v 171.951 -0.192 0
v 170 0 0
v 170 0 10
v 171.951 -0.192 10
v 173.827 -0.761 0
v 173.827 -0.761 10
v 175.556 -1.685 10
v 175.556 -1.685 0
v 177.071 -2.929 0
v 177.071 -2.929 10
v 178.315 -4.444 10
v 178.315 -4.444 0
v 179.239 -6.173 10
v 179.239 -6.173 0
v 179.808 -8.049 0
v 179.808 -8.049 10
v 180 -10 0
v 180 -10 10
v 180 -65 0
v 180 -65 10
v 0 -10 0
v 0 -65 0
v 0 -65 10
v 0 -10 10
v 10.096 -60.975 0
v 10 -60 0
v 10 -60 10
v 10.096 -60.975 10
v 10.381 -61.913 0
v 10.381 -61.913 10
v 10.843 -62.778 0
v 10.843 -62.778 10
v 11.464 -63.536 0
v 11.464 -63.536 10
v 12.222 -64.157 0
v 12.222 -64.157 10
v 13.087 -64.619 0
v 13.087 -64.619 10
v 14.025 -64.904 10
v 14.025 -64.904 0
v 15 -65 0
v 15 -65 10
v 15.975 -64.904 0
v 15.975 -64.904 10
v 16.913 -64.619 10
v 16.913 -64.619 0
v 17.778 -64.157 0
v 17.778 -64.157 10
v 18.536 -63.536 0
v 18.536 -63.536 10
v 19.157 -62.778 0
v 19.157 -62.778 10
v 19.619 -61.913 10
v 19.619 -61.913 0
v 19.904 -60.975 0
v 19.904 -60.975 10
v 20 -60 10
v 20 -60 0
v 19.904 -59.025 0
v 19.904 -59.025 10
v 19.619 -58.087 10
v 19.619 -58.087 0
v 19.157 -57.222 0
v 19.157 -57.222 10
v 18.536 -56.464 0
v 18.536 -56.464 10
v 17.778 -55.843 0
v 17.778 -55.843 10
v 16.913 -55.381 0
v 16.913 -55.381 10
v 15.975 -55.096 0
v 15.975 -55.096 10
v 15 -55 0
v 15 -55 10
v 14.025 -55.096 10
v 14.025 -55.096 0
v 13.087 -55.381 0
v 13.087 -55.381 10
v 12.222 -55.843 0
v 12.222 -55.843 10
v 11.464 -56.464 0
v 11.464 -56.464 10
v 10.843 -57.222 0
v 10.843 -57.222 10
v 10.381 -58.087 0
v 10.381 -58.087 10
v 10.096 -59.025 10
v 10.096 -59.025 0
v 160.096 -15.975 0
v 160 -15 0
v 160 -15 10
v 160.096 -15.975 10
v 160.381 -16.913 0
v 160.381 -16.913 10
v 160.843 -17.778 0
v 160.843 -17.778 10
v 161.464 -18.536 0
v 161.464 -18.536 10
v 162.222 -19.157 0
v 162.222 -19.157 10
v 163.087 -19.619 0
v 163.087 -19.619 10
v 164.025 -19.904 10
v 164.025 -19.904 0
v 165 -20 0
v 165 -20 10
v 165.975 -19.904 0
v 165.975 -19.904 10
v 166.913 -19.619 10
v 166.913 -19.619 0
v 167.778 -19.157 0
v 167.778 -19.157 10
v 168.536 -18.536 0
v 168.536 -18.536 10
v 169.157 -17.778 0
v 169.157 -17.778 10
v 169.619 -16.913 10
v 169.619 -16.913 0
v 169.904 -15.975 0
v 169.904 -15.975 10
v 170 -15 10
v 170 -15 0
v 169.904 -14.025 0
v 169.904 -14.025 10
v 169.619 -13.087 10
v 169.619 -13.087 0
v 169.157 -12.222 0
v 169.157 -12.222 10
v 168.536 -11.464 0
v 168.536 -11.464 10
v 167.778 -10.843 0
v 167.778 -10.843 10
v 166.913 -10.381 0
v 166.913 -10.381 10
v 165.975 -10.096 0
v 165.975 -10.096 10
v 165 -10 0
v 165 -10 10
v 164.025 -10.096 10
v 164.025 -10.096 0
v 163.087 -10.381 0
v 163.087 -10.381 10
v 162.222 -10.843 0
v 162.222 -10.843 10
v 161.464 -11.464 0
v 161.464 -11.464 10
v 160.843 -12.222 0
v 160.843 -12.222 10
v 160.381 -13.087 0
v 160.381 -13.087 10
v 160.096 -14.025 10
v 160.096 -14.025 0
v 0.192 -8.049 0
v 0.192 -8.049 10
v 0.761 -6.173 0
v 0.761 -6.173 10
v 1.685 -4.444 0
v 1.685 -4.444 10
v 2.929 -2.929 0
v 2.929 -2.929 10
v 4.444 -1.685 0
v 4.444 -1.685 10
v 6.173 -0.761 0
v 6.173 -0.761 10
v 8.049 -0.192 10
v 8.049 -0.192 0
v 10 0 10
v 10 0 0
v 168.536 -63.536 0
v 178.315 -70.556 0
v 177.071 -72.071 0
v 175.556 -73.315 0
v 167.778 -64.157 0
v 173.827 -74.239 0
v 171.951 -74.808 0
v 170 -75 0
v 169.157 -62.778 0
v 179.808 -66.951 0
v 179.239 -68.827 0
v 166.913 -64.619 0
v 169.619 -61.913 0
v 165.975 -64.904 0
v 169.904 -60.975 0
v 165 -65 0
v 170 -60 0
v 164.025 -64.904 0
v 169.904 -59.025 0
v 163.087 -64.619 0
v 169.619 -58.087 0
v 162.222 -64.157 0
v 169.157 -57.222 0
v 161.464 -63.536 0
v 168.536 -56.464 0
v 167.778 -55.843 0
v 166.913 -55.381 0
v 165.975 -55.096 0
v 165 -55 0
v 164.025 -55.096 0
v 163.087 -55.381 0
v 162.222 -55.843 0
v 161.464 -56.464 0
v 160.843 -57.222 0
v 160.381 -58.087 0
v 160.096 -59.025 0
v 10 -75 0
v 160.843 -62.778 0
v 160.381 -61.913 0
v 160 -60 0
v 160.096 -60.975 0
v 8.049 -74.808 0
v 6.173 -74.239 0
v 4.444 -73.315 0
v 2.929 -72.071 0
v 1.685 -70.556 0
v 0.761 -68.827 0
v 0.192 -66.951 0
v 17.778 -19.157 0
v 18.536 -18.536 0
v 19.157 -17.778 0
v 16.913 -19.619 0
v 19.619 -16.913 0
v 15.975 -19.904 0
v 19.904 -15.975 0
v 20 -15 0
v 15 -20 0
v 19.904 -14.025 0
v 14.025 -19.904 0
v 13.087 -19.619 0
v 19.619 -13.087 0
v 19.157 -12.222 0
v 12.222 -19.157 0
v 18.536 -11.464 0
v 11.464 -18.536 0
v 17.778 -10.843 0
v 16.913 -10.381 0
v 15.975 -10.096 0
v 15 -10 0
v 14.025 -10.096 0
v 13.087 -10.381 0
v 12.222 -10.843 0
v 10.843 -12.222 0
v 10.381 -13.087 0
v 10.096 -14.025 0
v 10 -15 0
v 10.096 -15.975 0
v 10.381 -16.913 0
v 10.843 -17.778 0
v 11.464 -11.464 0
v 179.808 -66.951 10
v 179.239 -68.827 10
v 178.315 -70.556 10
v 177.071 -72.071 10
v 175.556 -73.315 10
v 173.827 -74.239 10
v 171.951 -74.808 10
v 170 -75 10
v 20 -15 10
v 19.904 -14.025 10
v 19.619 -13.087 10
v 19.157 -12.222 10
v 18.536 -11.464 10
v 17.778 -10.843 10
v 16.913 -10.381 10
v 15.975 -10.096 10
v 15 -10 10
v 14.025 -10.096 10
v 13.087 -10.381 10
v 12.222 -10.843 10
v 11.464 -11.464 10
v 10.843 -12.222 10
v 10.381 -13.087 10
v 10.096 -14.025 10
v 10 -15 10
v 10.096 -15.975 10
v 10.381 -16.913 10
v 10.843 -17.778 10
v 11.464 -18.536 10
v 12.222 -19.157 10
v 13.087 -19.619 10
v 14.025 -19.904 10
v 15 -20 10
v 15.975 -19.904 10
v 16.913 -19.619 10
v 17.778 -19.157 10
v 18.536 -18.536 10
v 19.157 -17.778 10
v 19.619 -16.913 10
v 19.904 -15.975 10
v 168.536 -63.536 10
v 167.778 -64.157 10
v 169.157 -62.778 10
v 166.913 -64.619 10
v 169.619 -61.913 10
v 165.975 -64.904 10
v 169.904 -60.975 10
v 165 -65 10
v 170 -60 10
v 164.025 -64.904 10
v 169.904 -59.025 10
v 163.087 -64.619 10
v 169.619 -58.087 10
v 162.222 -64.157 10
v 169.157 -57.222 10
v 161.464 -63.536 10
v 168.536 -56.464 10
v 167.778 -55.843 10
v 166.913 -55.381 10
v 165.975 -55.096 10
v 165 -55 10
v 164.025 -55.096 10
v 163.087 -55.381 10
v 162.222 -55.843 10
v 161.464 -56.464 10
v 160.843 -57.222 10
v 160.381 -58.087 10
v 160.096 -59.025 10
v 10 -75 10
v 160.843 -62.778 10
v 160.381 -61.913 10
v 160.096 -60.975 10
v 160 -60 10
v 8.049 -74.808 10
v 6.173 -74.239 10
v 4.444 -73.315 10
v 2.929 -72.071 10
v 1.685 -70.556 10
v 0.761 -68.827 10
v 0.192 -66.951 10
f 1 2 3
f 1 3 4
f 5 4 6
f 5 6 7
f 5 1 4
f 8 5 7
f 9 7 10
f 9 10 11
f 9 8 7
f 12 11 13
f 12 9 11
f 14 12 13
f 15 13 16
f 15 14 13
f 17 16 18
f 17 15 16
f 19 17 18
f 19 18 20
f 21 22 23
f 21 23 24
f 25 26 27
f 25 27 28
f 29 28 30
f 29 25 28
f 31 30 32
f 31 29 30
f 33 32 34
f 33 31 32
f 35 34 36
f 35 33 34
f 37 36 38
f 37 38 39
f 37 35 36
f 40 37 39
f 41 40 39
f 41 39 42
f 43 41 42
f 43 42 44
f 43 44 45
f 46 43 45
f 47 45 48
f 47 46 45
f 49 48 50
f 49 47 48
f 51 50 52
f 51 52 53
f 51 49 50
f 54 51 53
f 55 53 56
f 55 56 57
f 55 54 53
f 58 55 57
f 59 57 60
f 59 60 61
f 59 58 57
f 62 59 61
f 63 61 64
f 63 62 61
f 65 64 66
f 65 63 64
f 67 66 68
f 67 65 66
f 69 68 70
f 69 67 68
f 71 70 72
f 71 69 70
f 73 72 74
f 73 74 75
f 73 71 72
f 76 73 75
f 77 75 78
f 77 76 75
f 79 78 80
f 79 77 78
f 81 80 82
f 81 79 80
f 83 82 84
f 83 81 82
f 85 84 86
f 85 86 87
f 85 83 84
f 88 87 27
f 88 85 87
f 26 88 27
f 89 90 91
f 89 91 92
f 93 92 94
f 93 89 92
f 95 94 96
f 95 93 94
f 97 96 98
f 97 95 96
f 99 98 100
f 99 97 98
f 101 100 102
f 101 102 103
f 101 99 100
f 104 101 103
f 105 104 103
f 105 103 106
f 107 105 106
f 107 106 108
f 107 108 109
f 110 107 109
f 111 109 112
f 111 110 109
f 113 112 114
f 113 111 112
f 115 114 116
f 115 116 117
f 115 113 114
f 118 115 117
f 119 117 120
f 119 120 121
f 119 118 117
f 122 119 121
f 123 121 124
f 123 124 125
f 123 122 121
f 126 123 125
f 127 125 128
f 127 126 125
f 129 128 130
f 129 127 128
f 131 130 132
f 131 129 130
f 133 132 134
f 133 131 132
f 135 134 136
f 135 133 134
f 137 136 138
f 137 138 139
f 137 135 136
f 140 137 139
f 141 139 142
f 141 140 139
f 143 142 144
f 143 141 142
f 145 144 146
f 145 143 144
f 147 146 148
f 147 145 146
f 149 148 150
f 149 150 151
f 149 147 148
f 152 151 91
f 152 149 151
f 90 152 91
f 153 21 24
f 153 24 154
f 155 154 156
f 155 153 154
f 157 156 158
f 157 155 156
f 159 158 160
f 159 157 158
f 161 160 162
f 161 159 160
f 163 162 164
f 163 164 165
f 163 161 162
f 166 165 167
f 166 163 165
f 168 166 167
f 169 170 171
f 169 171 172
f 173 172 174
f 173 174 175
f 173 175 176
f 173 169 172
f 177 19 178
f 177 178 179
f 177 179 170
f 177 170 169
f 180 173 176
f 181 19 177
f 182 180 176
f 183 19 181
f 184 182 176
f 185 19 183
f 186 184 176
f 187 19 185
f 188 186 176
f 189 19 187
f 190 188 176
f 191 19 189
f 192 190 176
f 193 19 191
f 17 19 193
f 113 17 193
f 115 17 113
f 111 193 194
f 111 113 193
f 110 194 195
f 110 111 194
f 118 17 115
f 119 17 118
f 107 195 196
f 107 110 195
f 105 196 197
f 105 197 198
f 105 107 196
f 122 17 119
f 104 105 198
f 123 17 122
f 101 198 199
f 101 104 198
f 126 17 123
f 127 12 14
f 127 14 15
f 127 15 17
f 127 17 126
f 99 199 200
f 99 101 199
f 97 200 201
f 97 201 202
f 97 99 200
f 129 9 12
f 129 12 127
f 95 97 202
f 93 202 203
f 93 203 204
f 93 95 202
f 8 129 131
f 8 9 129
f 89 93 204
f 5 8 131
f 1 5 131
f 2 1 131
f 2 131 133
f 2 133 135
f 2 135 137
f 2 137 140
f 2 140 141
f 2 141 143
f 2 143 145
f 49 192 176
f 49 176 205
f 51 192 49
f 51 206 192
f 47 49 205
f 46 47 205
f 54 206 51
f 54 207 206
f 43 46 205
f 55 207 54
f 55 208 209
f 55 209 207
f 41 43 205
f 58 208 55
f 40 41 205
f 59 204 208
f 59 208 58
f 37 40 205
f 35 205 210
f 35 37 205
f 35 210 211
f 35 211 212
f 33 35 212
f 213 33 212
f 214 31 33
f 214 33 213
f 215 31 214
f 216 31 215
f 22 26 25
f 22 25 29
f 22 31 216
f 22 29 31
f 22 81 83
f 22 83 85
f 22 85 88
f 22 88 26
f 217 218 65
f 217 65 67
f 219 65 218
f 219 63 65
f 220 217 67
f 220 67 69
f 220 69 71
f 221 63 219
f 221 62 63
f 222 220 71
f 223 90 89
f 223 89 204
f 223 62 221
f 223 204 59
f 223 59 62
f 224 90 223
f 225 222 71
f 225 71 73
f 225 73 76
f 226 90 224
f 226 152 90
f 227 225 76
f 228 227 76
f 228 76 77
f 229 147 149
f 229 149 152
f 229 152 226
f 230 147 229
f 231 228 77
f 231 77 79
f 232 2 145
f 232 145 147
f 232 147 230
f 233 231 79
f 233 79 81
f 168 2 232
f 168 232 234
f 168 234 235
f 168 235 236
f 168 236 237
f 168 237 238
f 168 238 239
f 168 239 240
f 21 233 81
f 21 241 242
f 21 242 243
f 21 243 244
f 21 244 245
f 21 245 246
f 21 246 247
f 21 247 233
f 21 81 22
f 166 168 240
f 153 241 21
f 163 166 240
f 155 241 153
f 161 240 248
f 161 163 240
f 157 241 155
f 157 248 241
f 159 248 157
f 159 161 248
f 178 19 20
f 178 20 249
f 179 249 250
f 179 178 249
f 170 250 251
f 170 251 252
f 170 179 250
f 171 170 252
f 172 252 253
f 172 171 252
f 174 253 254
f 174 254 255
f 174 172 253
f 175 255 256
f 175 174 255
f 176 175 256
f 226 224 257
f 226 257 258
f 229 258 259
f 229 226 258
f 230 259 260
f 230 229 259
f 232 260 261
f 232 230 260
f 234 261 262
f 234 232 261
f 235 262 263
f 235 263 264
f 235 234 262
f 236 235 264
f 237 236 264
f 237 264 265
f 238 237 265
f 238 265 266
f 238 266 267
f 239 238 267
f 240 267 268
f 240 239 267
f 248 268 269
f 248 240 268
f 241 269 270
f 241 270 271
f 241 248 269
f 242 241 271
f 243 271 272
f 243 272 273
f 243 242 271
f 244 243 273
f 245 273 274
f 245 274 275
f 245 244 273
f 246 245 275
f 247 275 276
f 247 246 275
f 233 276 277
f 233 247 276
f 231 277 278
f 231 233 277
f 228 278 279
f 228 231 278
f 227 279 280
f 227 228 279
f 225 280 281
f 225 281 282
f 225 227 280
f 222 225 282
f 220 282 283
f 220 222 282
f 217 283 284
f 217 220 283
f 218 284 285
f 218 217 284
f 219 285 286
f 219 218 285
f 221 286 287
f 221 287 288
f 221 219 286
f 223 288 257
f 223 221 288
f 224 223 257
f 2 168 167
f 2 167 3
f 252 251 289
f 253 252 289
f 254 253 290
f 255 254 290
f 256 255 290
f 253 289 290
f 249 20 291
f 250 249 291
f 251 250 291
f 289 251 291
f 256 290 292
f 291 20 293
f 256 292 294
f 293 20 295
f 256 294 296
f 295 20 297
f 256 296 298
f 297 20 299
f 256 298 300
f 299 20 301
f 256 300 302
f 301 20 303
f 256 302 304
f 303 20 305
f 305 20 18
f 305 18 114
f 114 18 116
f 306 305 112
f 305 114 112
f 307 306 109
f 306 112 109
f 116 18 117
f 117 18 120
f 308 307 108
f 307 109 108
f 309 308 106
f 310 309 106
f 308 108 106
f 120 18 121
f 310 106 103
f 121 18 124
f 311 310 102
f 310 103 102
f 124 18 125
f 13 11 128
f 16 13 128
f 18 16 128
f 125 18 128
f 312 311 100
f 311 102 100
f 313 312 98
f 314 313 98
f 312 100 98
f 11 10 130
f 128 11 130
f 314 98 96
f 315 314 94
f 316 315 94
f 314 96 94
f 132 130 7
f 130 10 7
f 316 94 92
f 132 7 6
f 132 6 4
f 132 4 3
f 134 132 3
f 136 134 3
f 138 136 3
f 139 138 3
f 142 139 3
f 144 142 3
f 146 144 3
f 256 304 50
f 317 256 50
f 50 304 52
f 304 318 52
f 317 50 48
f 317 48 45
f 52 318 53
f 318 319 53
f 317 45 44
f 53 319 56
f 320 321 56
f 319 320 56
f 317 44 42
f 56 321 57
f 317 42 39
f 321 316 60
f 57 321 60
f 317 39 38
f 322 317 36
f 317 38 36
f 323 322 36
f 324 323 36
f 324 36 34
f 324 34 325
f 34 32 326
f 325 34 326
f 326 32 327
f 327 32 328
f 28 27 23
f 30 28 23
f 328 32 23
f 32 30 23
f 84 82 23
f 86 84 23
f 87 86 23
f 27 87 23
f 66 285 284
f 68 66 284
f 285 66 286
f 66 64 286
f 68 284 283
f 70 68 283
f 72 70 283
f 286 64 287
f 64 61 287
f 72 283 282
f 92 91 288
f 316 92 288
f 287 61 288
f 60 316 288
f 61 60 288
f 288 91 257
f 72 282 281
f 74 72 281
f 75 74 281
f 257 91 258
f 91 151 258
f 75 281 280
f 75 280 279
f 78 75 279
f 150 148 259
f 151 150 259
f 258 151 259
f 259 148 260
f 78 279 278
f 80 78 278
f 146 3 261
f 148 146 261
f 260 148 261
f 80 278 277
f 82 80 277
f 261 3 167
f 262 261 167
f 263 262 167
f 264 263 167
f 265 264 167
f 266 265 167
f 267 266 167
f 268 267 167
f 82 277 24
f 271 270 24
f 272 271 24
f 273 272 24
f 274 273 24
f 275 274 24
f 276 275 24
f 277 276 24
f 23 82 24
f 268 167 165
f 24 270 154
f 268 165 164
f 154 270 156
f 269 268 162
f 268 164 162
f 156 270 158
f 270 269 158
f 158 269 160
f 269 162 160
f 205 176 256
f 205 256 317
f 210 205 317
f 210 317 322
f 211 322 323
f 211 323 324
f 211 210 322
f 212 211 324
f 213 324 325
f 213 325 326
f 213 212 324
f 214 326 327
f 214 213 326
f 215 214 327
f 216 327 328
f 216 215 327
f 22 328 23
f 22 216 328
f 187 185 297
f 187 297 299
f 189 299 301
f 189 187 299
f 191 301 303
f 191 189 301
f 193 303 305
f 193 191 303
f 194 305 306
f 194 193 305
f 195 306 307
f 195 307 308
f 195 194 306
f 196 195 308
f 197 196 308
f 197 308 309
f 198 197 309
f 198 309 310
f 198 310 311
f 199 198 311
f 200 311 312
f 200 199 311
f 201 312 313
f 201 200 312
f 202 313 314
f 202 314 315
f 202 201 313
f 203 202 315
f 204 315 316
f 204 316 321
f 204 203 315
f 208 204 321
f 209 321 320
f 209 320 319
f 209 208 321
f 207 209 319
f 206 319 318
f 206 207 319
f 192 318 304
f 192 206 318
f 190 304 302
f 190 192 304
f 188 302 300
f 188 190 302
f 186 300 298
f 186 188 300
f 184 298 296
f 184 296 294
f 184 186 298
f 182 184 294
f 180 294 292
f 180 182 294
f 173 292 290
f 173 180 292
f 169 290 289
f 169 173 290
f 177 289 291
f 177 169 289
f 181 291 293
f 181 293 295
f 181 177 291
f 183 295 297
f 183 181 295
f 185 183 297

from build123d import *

# Parameters (mm, degrees)
BOSS_EXTRUDE1_DEPTH = 10
SKETCH6_R           = 5
CUT_EXTRUDE1_DEPTH  = 10
SKETCH6_4_R         = 5
CUT_EXTRUDE4_DEPTH  = 10


with BuildPart() as part:
    # Sketch2 → Boss-Extrude1 (new body)
    with BuildSketch(Plane.XY):
        with BuildLine():
            Line((10, 0), (170, 0))
            ThreePointArc((170, 0), (177.071067812, -2.928932188), (180, -10))
            Line((180, -10), (180, -65))
            ThreePointArc((180, -65), (177.071067812, -72.071067812), (170, -75))
            Line((170, -75), (10, -75))
            ThreePointArc((10, -75), (2.928932188, -72.071067812), (0, -65))
            Line((0, -65), (0, -10))
            ThreePointArc((0, -10), (2.928932188, -2.928932188), (10, 0))
        make_face()
    extrude(amount=BOSS_EXTRUDE1_DEPTH)

    # Sketch6 → Cut-Extrude1 (cut)
    with BuildSketch(Plane.XY):
        with Locations((15, -15)):
            Circle(SKETCH6_R)
    extrude(amount=CUT_EXTRUDE1_DEPTH, mode=Mode.SUBTRACT)

    # Sketch6<4> → Cut-Extrude4 (cut)
    with BuildSketch(Plane.XY):
        with Locations((165, -15)):
            Circle(SKETCH6_4_R)
        with Locations((15, -60)):
            Circle(SKETCH6_4_R)
        with Locations((165, -60)):
            Circle(SKETCH6_4_R)
    extrude(amount=CUT_EXTRUDE4_DEPTH, mode=Mode.SUBTRACT)


solid = part.part
